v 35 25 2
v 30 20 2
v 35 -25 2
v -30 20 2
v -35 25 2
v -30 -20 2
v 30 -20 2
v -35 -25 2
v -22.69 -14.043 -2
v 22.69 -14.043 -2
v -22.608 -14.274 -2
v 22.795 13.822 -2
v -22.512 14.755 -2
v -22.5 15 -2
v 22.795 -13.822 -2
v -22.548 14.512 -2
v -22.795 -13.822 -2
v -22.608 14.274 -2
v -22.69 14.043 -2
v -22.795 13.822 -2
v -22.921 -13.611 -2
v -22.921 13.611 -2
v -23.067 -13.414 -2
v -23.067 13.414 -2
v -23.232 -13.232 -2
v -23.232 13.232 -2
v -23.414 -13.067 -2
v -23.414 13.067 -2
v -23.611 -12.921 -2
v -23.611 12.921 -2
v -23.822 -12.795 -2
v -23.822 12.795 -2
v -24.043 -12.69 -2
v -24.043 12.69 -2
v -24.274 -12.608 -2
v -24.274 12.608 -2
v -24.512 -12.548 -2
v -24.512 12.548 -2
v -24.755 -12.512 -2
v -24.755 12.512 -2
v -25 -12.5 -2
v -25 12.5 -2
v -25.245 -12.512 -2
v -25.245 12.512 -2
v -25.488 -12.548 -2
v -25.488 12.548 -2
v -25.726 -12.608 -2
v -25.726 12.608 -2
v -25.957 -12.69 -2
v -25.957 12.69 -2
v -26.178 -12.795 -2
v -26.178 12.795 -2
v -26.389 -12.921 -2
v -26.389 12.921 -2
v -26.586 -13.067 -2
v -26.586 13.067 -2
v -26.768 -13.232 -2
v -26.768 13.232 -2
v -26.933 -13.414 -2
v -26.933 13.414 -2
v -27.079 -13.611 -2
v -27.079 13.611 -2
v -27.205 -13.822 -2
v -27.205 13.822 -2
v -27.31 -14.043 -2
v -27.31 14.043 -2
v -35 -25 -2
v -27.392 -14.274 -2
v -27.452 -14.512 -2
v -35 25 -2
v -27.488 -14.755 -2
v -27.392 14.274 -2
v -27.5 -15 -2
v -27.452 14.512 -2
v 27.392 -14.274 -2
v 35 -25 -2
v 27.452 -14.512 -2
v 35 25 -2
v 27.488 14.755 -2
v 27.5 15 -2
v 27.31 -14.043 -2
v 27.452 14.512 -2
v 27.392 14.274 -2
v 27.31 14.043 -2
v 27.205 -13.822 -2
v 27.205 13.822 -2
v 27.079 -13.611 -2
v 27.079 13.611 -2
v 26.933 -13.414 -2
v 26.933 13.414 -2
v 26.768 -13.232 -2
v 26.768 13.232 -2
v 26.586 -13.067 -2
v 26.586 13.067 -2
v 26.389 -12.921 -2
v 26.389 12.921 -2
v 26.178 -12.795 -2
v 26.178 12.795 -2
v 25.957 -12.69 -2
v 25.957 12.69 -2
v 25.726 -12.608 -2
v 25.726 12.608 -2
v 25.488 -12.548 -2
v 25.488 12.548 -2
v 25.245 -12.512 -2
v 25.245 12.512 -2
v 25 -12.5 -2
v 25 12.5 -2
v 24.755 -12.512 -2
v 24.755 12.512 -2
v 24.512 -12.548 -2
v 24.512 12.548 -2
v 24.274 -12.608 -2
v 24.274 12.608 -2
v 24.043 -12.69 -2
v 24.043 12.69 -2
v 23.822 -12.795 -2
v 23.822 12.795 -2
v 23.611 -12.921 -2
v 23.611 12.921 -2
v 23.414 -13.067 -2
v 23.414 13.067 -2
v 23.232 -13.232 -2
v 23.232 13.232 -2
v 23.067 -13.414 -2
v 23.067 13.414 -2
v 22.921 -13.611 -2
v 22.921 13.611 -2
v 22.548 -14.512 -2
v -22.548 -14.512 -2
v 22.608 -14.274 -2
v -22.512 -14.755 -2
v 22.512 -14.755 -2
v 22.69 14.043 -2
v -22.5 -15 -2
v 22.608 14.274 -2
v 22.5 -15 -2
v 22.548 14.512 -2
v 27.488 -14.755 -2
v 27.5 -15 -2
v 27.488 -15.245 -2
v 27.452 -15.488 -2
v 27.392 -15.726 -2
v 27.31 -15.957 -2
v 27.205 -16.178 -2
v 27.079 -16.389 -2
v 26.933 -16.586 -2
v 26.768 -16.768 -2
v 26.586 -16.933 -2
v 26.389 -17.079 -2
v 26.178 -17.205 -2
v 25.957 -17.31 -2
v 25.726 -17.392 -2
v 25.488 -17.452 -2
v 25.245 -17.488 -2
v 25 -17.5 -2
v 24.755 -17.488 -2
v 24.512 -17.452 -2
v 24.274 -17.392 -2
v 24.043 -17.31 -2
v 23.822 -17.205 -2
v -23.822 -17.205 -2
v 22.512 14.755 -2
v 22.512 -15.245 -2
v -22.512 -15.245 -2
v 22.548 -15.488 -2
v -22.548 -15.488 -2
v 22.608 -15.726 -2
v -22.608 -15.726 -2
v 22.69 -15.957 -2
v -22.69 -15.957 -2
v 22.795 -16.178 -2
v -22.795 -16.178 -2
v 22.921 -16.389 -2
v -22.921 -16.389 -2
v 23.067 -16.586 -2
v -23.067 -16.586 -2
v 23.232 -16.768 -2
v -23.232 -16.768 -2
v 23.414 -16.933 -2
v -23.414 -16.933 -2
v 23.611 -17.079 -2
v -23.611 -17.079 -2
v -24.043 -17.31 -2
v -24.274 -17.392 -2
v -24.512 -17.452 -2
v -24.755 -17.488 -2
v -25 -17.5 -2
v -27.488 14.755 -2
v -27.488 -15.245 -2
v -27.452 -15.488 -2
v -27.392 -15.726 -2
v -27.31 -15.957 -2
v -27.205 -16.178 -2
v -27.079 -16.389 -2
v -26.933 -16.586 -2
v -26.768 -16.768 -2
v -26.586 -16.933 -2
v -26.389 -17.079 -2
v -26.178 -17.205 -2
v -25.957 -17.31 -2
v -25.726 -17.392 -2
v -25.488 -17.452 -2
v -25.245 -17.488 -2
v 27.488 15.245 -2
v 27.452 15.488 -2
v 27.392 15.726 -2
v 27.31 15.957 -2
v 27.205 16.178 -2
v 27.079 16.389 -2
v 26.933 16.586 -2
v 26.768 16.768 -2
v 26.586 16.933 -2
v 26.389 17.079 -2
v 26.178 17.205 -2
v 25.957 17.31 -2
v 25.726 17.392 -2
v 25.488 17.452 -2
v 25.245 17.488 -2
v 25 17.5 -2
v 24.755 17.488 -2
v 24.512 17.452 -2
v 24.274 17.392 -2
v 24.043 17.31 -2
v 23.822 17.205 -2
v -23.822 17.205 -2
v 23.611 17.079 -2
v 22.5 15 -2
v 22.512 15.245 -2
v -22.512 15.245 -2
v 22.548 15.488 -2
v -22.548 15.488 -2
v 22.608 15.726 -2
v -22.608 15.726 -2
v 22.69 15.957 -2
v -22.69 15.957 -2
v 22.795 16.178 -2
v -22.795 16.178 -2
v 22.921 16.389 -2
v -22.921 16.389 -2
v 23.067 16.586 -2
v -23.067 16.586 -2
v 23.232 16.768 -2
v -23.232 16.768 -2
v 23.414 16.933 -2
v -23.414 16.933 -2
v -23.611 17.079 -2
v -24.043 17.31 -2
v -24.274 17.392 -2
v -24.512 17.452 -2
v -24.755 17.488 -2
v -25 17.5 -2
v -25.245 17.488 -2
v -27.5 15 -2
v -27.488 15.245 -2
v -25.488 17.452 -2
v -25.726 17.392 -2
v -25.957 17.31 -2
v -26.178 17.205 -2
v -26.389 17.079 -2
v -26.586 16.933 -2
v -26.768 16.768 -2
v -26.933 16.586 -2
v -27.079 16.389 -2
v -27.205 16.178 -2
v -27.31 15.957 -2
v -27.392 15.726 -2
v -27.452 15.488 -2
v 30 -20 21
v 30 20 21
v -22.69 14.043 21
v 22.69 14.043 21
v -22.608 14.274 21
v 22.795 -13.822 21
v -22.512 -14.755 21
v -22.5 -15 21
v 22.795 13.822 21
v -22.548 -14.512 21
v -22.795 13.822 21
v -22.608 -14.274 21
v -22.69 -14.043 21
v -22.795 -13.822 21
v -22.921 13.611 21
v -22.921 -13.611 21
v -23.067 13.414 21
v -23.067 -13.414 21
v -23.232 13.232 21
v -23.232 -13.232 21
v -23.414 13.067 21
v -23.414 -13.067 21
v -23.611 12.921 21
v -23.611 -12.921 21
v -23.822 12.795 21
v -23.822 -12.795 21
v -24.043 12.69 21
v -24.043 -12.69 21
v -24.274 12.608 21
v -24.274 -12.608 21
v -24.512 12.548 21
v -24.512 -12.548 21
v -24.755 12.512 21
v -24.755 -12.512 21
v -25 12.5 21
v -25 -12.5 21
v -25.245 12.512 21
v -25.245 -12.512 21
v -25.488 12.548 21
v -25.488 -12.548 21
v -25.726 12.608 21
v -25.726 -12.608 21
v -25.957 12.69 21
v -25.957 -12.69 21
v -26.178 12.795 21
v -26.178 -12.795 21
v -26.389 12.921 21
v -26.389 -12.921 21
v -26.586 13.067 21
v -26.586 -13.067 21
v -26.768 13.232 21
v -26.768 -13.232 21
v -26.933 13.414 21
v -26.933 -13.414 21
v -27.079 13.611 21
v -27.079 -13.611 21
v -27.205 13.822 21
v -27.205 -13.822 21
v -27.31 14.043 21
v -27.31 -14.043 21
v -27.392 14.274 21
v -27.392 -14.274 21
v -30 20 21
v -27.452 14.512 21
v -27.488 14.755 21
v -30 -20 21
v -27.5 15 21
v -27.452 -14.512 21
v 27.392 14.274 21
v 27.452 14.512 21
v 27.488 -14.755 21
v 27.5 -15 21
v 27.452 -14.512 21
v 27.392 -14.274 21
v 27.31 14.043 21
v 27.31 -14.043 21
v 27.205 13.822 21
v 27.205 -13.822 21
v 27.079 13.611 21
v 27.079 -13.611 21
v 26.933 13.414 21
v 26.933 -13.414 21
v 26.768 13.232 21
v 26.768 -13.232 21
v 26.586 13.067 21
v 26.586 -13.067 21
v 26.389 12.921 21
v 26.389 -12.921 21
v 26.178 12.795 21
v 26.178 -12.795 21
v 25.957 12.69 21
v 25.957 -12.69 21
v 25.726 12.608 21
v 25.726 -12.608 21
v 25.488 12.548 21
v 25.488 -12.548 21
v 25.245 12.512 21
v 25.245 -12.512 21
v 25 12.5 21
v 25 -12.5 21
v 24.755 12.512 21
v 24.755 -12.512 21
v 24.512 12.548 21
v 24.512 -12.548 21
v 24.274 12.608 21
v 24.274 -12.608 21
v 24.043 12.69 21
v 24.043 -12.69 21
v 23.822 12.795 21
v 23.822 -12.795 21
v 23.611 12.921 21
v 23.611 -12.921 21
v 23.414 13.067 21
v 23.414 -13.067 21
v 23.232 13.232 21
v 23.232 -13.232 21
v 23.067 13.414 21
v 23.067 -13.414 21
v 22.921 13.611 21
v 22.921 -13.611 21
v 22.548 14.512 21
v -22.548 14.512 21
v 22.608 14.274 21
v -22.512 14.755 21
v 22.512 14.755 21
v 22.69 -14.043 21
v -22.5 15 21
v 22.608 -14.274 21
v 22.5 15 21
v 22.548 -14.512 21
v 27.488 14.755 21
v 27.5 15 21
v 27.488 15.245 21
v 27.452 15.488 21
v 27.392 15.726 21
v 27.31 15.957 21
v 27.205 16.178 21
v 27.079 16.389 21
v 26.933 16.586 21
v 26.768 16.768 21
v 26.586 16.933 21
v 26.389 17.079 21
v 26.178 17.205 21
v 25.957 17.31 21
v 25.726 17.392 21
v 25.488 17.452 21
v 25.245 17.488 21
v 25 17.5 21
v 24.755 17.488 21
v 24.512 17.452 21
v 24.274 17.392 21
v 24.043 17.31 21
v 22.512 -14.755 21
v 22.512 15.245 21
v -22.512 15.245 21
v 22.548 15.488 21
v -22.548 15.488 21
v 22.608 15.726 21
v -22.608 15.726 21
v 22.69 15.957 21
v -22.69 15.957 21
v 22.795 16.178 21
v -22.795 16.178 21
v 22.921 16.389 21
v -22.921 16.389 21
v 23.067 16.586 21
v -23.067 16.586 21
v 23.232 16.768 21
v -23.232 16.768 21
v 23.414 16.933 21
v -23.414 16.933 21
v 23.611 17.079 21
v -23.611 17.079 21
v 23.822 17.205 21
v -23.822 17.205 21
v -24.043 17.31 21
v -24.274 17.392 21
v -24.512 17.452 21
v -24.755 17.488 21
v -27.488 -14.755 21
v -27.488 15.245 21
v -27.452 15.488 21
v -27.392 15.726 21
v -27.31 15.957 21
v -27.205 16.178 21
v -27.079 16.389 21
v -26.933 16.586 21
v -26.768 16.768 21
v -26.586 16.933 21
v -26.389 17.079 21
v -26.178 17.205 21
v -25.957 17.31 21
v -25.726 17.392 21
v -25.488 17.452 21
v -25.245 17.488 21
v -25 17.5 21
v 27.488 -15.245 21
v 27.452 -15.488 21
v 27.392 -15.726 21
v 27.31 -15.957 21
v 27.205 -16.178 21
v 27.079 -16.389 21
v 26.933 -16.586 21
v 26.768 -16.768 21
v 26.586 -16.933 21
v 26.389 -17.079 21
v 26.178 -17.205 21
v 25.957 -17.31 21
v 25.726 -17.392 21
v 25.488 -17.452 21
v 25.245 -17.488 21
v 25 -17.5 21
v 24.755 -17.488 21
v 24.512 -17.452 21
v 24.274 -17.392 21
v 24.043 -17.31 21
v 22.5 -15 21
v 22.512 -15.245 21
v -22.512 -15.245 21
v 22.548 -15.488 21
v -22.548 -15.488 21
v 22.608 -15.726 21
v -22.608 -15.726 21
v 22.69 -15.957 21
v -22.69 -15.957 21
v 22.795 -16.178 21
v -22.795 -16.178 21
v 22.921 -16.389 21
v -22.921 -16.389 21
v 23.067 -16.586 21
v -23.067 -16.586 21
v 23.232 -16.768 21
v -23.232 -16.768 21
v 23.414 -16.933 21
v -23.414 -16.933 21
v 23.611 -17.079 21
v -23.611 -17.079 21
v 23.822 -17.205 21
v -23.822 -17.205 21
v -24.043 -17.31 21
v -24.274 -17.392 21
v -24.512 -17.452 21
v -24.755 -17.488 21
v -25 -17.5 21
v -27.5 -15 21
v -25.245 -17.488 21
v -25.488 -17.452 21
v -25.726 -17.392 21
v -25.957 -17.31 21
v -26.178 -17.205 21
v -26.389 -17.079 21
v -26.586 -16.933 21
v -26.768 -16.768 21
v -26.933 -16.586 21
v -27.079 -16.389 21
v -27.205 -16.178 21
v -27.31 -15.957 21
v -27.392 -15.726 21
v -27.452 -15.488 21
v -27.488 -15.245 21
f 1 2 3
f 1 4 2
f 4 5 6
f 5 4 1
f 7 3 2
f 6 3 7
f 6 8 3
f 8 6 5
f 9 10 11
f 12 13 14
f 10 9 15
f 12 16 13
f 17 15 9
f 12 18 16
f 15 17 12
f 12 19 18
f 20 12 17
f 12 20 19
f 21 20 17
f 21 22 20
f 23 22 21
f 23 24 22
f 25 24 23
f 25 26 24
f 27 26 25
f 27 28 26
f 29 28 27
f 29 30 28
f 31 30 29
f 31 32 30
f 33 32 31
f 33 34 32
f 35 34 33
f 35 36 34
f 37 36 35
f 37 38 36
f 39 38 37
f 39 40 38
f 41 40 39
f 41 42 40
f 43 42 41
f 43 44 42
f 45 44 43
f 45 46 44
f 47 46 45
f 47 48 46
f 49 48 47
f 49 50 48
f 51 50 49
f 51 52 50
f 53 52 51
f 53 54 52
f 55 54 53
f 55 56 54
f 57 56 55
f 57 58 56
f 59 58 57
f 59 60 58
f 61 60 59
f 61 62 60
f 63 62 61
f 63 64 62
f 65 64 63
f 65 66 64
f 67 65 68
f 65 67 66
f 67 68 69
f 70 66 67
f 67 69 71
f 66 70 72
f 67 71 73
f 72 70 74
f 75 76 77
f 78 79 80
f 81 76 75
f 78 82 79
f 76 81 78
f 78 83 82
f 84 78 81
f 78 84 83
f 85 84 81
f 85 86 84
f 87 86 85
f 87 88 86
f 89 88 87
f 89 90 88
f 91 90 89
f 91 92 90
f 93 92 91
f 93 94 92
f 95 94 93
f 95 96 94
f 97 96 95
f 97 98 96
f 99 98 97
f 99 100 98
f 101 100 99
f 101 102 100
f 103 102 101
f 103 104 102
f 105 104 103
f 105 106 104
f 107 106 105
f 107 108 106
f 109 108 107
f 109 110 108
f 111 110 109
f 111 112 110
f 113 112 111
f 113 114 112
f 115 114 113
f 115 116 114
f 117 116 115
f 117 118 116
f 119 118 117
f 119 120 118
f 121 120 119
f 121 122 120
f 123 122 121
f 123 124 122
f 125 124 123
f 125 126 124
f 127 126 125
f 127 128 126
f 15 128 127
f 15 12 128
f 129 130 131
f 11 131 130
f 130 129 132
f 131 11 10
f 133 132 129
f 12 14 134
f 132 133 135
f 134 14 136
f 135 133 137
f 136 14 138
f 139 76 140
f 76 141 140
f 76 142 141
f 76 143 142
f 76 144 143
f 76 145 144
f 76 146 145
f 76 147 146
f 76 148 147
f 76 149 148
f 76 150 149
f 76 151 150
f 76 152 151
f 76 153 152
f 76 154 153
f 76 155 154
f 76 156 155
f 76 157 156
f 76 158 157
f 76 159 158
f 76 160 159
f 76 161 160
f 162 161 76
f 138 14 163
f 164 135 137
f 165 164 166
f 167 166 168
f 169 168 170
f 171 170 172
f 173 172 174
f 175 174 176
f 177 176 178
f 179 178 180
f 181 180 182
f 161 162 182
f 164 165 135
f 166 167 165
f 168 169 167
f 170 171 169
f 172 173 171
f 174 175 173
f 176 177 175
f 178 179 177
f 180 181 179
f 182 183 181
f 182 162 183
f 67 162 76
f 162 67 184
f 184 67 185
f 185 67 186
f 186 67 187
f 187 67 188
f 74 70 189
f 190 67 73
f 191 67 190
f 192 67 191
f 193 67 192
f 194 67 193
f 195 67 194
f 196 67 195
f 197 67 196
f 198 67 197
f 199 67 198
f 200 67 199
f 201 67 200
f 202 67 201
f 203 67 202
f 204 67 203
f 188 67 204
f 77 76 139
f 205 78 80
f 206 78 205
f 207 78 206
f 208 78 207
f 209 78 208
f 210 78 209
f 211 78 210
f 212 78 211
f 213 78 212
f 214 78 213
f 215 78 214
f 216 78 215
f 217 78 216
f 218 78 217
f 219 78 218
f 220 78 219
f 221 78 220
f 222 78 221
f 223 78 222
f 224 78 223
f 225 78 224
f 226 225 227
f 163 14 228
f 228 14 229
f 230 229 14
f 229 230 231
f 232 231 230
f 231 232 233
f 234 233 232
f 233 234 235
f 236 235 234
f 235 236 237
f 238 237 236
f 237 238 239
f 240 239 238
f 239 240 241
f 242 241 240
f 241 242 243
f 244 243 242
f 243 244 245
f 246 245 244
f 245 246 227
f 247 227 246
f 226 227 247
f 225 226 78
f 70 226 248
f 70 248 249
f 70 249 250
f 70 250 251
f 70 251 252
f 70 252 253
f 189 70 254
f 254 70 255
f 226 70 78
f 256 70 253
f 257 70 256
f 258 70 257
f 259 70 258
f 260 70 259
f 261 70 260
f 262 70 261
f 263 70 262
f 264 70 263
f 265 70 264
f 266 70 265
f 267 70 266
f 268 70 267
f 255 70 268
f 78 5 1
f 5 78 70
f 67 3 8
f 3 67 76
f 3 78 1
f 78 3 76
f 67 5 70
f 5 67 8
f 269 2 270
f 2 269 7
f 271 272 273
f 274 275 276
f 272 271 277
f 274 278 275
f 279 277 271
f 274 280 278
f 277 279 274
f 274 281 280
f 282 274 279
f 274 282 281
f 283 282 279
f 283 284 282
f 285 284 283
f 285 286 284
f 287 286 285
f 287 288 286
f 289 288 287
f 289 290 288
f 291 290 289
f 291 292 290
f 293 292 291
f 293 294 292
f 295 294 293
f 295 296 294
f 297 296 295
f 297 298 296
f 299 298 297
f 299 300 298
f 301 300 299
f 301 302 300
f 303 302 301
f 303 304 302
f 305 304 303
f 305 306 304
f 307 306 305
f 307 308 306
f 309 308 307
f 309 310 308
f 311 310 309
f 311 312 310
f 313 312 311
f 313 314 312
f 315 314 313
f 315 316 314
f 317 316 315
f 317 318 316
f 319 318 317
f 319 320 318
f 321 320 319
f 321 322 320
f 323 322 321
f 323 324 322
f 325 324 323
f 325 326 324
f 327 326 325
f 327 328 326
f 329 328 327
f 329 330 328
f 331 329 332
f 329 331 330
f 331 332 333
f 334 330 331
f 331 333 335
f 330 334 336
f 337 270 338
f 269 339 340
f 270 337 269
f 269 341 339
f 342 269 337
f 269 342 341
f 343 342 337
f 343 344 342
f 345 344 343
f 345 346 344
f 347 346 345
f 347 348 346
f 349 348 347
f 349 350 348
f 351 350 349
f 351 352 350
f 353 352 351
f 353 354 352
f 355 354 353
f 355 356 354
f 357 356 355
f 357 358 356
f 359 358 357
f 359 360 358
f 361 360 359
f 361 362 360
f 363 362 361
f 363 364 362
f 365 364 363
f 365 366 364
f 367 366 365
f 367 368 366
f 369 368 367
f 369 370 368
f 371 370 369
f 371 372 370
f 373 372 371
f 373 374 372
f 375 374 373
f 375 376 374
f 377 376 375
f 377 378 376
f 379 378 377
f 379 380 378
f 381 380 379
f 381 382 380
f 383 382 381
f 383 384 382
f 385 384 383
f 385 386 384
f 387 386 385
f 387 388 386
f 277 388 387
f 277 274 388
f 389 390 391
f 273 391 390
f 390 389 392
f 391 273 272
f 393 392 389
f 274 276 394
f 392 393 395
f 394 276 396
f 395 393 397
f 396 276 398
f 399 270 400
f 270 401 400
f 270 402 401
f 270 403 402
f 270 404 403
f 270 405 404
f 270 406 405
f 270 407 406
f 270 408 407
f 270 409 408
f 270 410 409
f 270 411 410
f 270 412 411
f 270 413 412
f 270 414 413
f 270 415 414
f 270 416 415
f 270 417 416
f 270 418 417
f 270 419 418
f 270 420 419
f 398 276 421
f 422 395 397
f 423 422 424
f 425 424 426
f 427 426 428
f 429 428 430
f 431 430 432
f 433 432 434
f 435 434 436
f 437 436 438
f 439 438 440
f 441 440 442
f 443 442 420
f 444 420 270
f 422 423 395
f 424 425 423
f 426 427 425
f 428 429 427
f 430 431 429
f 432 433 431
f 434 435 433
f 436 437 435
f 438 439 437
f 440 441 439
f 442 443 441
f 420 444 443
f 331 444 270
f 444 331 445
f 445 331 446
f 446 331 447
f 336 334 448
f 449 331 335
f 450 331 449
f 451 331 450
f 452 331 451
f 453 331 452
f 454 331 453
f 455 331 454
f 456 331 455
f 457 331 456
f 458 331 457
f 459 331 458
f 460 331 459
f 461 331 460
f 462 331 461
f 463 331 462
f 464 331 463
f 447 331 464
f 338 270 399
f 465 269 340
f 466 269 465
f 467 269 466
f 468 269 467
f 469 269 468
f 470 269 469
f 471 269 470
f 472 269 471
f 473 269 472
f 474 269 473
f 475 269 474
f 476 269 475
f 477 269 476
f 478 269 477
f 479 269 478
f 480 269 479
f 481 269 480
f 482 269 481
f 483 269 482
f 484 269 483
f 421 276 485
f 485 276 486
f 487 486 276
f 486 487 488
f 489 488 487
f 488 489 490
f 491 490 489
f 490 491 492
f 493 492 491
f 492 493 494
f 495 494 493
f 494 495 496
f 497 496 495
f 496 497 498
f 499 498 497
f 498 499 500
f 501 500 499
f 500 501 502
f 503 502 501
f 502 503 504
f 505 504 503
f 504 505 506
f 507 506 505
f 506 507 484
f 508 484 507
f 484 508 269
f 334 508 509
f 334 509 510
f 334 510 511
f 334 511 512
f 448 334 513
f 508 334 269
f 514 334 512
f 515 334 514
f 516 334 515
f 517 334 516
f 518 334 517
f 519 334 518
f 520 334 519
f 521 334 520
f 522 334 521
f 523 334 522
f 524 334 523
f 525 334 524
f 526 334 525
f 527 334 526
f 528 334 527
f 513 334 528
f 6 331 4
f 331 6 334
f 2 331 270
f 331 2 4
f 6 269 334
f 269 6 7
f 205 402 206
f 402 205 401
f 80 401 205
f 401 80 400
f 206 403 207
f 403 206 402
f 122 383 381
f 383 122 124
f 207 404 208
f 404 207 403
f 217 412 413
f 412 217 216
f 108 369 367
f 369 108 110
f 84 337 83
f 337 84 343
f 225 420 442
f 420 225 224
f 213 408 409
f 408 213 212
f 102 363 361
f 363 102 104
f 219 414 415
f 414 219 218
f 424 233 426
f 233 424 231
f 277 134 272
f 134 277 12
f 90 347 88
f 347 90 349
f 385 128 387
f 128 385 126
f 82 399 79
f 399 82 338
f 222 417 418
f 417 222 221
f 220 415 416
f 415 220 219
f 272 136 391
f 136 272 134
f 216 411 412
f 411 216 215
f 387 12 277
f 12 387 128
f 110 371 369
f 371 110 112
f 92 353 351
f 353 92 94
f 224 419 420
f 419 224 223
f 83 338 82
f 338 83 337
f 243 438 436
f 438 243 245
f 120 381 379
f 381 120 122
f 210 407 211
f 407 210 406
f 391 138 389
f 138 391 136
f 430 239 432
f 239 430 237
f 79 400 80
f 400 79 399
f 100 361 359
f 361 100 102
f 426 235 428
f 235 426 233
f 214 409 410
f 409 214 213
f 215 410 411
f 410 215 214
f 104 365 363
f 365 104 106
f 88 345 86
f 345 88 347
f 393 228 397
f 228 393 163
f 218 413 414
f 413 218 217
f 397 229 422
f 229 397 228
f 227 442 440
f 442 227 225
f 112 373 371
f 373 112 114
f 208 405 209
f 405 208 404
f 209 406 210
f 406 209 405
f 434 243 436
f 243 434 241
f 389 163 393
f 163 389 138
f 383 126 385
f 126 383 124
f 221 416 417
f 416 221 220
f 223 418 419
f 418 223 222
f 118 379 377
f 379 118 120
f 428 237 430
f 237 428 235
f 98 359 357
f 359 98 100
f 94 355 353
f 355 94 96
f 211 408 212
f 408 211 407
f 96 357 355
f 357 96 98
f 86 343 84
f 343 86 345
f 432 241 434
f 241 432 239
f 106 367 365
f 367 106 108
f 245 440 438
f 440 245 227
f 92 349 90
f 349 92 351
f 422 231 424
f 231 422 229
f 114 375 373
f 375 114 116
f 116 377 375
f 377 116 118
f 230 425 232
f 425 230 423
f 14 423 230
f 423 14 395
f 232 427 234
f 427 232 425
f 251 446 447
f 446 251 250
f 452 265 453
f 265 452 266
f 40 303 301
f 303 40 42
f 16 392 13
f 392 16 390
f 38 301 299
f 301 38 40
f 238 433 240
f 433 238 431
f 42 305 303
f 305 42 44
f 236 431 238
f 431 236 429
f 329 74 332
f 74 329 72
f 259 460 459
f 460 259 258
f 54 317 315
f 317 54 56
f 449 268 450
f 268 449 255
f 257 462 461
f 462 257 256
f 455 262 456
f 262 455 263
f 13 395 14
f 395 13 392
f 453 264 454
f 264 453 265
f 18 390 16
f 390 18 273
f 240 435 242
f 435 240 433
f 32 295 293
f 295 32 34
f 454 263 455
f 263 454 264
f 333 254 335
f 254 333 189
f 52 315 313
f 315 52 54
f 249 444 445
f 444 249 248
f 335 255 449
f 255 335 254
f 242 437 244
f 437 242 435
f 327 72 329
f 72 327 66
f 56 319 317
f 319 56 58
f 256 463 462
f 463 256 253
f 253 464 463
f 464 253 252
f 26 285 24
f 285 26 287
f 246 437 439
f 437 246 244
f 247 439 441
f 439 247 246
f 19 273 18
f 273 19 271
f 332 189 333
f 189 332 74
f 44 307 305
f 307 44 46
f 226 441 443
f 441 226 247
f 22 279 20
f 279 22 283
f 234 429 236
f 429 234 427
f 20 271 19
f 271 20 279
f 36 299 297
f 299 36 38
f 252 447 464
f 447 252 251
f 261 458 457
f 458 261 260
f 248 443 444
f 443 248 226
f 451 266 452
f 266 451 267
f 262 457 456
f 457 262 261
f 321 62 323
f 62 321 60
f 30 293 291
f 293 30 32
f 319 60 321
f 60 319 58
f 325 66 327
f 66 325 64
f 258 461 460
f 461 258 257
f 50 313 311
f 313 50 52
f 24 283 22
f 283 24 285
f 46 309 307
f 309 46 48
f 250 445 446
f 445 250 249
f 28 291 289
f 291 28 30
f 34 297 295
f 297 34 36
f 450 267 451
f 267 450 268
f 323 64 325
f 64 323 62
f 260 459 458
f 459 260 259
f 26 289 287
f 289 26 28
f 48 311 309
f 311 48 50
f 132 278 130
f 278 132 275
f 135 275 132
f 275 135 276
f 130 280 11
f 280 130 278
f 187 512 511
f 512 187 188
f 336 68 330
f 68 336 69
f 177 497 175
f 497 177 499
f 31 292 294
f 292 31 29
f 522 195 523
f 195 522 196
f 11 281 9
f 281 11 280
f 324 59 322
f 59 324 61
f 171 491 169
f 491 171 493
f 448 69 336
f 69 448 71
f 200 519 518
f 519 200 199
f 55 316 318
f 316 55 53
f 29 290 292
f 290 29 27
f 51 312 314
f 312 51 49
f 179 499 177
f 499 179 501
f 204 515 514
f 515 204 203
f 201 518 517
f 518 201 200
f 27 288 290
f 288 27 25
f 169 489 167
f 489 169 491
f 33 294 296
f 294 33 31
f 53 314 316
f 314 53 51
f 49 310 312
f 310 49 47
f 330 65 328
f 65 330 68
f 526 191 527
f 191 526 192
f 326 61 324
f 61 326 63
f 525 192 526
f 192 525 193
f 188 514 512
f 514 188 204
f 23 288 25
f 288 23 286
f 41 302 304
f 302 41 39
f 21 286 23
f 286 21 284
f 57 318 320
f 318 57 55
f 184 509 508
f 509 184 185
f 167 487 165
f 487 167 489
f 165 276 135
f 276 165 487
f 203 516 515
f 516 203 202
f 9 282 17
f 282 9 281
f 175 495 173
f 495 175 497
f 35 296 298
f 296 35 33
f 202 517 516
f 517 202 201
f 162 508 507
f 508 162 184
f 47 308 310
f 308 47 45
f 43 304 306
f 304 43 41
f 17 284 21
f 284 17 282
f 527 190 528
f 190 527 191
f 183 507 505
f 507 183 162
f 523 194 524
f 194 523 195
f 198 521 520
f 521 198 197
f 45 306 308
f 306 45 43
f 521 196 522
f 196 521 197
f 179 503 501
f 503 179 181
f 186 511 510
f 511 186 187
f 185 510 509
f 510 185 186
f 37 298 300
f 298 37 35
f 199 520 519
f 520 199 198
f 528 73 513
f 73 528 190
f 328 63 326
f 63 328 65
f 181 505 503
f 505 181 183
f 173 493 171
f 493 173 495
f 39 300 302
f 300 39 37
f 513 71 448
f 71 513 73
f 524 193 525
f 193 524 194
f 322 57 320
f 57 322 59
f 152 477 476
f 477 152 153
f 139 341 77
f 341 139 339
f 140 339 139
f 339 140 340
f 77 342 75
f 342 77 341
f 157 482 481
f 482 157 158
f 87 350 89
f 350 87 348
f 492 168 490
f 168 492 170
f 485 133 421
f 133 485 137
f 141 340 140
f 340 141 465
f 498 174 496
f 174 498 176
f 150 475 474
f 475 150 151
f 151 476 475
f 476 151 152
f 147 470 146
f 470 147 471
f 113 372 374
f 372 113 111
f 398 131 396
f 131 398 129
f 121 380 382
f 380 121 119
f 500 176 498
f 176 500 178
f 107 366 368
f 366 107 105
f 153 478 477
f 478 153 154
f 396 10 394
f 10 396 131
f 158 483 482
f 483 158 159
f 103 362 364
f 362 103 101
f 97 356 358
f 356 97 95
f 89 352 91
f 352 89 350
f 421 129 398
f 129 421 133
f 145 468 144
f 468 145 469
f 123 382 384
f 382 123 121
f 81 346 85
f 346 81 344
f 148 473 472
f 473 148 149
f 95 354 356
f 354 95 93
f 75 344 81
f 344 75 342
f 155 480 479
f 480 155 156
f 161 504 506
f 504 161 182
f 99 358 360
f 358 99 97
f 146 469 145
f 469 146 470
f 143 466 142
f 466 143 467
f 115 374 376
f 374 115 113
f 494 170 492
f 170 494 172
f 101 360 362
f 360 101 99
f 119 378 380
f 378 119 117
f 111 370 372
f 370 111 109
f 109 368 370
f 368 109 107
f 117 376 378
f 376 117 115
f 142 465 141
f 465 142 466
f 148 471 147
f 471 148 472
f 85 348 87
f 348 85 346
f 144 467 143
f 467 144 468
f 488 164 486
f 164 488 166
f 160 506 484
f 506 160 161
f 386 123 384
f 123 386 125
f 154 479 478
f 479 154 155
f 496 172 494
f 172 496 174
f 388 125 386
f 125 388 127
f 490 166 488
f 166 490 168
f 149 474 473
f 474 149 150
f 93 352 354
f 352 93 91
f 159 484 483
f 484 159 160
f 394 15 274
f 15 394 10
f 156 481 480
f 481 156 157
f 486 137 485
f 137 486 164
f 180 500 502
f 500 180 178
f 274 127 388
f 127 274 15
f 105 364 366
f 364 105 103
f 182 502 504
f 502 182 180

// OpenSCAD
$fn = 64;

// Parameters
body_L = 60; //[30:120:1]
body_W = 40; //[20:80:1]
body_H = 20; //[10:40:1]

flange_L = 70; //[35:140:1]
flange_W = 50; //[25:100:1]
flange_T = 4;  //[2:10:1]

hole_d = 5; //[2:12:1]
hole_spacing_X = 50; //[20:100:1]
hole_spacing_Y = 30; //[15:80:1]
hole_edge_margin = 10; //[5:25:1]

overlap = 1; //[0.5:2:0.5]

// Derived placement (keeps solids connected and holes centered through full thickness)
z_body_center = flange_T/2 + body_H/2 - overlap;
total_h = flange_T + body_H + 2*overlap;

// Clamp hole spacing so holes stay within flange with margin
max_sx = max(0, flange_L - 2*hole_edge_margin);
max_sy = max(0, flange_W - 2*hole_edge_margin);
sx = min(hole_spacing_X, max_sx);
sy = min(hole_spacing_Y, max_sy);

// Main body box (connected to flange with overlap)
module main_body_box() {
  translate([0, 0, z_body_center])
    cube([body_L, body_W, body_H], center=true);
}

// Base flange box
module base_flange_box() {
  cube([flange_L, flange_W, flange_T], center=true);
}

// Mounting hole cylinder (cuts through flange + body)
module mount_hole_cyl(x, y) {
  translate([x, y, z_body_center])
    cylinder(h=total_h, r=hole_d/2, center=true);
}

// Component with holes (single connected solid)
module component_final() {
  difference() {
    union() {
      base_flange_box();
      main_body_box();

      // Side flanges/ears (subtle) to match views; guaranteed connected
      ear_len = max(0, (flange_L - body_L)/2);
      if (ear_len > 0)
        for (s = [-1, 1])
          translate([s*(body_L/2 + ear_len/2 - overlap), 0, 0])
            cube([ear_len, flange_W, flange_T], center=true);
    }

    // 4 mounting holes
    mount_hole_cyl( sx/2,  sy/2);
    mount_hole_cyl(-sx/2,  sy/2);
    mount_hole_cyl(-sx/2, -sy/2);
    mount_hole_cyl( sx/2, -sy/2);
  }
}

color("Silver") component_final();
